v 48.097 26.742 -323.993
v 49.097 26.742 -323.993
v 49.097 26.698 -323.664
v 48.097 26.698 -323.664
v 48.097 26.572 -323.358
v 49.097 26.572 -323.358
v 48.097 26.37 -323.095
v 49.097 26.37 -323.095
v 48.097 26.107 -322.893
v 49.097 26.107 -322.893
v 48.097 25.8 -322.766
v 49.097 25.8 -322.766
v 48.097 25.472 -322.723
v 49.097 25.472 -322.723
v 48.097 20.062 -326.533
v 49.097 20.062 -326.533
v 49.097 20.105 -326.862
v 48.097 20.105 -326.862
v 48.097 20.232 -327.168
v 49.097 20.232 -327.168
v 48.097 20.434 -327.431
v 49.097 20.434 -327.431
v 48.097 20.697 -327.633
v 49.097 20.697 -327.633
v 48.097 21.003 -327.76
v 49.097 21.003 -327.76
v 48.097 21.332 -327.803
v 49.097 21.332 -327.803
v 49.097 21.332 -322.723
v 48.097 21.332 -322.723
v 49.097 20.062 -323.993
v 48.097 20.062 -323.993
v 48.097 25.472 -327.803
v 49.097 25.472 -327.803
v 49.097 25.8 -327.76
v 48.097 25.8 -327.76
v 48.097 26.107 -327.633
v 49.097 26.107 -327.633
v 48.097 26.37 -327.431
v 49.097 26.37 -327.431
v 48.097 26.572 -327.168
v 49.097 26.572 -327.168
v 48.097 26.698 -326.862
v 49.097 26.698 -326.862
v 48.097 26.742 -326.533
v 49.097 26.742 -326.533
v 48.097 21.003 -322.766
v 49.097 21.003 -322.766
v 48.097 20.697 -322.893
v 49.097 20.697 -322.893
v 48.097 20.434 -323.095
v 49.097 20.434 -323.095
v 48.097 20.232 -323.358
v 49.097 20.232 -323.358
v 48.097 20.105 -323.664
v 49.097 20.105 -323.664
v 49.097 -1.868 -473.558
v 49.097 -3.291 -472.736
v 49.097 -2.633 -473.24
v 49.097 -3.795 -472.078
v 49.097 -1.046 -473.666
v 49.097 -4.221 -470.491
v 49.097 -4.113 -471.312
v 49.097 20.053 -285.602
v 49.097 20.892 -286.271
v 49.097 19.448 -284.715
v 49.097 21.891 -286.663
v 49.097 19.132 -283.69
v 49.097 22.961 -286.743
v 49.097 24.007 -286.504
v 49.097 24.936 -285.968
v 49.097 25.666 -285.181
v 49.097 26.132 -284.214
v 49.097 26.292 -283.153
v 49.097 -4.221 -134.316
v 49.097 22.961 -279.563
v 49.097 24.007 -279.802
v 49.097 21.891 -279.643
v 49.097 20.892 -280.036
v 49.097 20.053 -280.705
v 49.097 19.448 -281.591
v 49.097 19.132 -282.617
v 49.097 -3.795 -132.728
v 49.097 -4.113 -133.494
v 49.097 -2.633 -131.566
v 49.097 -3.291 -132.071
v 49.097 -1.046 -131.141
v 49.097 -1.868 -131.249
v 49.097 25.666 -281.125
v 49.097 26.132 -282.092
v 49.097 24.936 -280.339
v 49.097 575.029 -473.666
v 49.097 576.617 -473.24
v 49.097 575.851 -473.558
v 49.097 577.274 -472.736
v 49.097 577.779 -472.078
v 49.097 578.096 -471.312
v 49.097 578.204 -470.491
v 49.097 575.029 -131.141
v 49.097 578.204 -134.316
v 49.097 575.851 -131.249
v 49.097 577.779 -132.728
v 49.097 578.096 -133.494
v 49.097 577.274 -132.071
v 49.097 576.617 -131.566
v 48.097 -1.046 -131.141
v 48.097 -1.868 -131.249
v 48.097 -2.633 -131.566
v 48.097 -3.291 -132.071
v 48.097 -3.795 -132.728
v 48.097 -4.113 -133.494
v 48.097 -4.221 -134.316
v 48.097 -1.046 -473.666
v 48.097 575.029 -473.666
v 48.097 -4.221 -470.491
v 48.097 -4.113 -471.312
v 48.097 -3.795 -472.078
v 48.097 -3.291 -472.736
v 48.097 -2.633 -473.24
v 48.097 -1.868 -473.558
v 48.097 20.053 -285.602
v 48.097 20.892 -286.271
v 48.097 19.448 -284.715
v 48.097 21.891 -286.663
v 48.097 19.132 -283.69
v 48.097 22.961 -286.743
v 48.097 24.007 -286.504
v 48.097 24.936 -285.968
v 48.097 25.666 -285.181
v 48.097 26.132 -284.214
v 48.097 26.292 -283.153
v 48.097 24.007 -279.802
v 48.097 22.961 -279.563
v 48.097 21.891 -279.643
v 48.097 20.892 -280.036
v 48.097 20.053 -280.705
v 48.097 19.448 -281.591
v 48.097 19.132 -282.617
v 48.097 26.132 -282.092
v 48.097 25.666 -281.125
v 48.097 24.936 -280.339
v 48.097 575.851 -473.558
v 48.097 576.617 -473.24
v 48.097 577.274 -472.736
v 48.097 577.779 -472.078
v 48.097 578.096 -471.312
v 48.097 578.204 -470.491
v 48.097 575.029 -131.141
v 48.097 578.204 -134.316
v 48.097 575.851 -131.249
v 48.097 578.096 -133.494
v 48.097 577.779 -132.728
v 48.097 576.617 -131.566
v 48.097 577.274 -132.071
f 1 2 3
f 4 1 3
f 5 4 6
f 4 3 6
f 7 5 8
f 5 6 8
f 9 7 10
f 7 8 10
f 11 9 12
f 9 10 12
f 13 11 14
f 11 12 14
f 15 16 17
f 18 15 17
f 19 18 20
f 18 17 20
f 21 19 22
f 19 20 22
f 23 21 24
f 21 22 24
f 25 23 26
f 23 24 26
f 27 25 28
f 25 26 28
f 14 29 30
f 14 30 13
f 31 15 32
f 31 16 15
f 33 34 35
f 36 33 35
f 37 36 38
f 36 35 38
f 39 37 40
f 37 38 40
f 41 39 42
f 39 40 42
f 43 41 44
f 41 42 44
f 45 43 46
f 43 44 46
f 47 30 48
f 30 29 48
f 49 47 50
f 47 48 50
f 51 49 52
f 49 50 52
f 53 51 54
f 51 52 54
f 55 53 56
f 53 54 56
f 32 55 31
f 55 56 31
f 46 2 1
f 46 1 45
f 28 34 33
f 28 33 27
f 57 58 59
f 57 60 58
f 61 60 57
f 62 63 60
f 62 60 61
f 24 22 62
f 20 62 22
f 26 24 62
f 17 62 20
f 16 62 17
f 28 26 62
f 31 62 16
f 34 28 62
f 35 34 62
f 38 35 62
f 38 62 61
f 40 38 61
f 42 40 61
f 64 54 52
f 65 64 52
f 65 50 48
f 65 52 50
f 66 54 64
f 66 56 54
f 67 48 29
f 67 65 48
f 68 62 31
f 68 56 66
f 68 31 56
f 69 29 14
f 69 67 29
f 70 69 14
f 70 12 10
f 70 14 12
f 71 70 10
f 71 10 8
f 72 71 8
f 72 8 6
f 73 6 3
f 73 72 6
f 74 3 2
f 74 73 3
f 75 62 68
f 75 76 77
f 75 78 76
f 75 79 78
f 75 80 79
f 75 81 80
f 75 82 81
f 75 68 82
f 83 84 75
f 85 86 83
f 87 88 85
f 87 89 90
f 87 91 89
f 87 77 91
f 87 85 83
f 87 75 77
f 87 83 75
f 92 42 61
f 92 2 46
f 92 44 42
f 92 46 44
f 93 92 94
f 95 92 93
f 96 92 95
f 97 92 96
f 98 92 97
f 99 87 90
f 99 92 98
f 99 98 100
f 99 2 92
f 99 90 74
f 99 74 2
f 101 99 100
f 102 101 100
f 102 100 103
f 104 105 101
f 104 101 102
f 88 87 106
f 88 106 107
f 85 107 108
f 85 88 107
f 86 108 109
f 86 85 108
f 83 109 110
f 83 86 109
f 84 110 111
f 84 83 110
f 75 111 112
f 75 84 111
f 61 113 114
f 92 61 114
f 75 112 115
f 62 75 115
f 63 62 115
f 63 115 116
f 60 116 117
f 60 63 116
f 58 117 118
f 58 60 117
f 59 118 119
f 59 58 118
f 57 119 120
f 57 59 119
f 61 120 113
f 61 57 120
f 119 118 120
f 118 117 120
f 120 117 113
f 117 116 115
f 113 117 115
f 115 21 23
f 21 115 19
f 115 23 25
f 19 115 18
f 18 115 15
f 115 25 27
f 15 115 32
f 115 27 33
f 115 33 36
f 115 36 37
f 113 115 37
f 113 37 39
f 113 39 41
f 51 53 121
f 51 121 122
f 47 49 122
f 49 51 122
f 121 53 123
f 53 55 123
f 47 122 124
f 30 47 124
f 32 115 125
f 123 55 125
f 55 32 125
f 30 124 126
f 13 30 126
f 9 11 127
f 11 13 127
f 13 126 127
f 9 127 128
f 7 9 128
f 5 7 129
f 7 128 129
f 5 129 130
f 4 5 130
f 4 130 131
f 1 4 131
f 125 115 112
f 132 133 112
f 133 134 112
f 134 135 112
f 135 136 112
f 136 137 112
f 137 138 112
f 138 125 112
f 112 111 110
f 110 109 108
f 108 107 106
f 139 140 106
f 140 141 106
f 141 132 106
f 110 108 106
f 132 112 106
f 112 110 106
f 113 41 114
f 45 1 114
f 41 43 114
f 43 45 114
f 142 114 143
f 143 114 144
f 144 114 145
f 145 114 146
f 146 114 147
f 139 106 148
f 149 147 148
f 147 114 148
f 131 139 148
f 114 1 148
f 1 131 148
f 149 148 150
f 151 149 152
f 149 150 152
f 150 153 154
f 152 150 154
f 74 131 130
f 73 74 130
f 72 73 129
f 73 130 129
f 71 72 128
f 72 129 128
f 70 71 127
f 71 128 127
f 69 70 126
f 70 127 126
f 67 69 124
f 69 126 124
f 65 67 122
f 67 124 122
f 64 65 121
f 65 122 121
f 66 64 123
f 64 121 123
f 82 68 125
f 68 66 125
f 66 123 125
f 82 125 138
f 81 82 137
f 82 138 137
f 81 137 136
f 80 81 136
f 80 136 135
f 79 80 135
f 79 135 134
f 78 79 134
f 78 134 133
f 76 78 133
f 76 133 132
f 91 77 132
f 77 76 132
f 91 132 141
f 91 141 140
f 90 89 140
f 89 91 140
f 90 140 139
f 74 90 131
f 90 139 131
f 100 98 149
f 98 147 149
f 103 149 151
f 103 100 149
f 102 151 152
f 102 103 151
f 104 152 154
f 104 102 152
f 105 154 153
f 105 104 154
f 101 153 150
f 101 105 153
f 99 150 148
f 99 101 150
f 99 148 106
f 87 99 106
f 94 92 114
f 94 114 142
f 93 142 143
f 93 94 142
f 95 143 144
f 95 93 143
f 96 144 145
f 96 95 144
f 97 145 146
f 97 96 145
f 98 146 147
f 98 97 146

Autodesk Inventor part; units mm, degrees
ref_plane "YZ Plane" through (0, 0, 0) normal (1, 0, 0) x (0, 1, 0)
ref_plane "XZ Plane" through (0, 0, 0) normal (0, 1, 0) x (-1, 0, 0)
ref_plane "XY Plane" through (0, 0, 0) normal (0, 0, 1) x (1, 0, 0)
ref_plane "Work Plane1" through (48.0967, 298.9917, -302.4032) normal (1, 0, 0) x (0, 1, 0)
sketch "Sketch1" plane through (48.0967, 298.9917, -302.4032) normal (1, 0, 0) x (0, 1, 0)
  circle A0 centre (-276.3, 19.25) radius 3.6
  arc A1 (255.27, -148.59) -> (256.54, -147.32) centre (255.27, -147.32) ccw
  line L0 (256.54, 140.97) -> (256.54, -147.32)
  line L1 (-256.54, 140.97) -> (256.54, 140.97)
  line L2 (-256.54, -147.32) -> (-256.54, 140.97)
  arc A2 (-256.54, -147.32) -> (-255.27, -148.59) centre (-255.27, -147.32) ccw
  line L3 (255.27, -148.59) -> (-255.27, -148.59)
  line L4 (266.7, 140.97) -> (266.7, -154.94)
  line L5 (262.89, -158.75) -> (-262.89, -158.75)
  line L6 (262.89, 158.75) -> (-262.89, 158.75)
  line L7 (-290.7, 29.75) -> (-290.7, 8.75)
  line L8 (266.7, -158.75) -> (-290.7, -158.75)
  line L9 (266.7, 158.75) -> (266.7, -158.75)
  line L10 (-303.2125, 171.2625) -> (-303.2125, -171.2625)
  line L11 (-303.2125, -171.2625) -> (279.2125, -171.2625)
  line L12 (279.2125, -171.2625) -> (279.2125, 171.2625)
  line L13 (279.2125, 171.2625) -> (-303.2125, 171.2625)
  line L14 (-277.69, -21.56) -> (-277.69, -24.16)
  line L15 (-277.69, -24.16) -> (-273.49, -24.16)
  line L16 (-273.49, -24.16) -> (-273.49, -21.56)
  line L17 (-273.49, -21.56) -> (-277.69, -21.56)
  line L18 (-272.25, -25.4) -> (-278.93, -25.4)
  line L19 (-278.93, -25.4) -> (-278.93, -20.32)
  line L20 (-278.93, -20.32) -> (-272.25, -20.32)
  line L21 (-272.25, -20.32) -> (-272.25, -25.4)
  point P0 (-298.9917, 302.4032)
extrude "Extrusion1" add sketch "Sketch1" along normal blind 1 contours L3 A2 L2 L1 L0 A1 | L13 L12 L11 L10 | L18 L19 L20 L21
fillet "Fillet1" radius 3.175 4 edges at (48.5967, -4.2208, -131.1407) (48.5967, -4.2208, -473.6657) (48.5967, 578.2042, -473.6657) (48.5967, 578.2042, -131.1407)
sketch "Sketch2" plane through (49.0967, 298.9917, -302.4032) normal (1, 0, 0) x (0, 0, -1)
  line L0 (21.56, -273.49) -> (24.16, -273.49) projected
  line L1 (21.56, -277.69) -> (21.56, -273.49) projected
  line L2 (24.16, -277.69) -> (21.56, -277.69) projected
  line L3 (24.16, -273.49) -> (24.16, -277.69) projected
  line L4 (24.13, -278.93) -> (21.59, -278.93)
  line L5 (20.32, -277.66) -> (20.32, -273.52)
  line L6 (21.59, -272.25) -> (24.13, -272.25)
  line L7 (25.4, -273.52) -> (25.4, -277.66)
  arc A0 (25.4, -273.52) -> (24.13, -272.25) centre (24.13, -273.52) ccw
  arc A1 (24.13, -278.93) -> (25.4, -277.66) centre (24.13, -277.66) ccw
  arc A2 (20.32, -277.66) -> (21.59, -278.93) centre (21.59, -277.66) ccw
  arc A3 (21.59, -272.25) -> (20.32, -273.52) centre (21.59, -273.52) ccw
  point P0 (-302.4032, -298.9917)
  dimension "d4" = 1.27
extrude "Extrusion2" cut sketch "Sketch2" against normal blind 1
properties material "Acetal Resin, White"
